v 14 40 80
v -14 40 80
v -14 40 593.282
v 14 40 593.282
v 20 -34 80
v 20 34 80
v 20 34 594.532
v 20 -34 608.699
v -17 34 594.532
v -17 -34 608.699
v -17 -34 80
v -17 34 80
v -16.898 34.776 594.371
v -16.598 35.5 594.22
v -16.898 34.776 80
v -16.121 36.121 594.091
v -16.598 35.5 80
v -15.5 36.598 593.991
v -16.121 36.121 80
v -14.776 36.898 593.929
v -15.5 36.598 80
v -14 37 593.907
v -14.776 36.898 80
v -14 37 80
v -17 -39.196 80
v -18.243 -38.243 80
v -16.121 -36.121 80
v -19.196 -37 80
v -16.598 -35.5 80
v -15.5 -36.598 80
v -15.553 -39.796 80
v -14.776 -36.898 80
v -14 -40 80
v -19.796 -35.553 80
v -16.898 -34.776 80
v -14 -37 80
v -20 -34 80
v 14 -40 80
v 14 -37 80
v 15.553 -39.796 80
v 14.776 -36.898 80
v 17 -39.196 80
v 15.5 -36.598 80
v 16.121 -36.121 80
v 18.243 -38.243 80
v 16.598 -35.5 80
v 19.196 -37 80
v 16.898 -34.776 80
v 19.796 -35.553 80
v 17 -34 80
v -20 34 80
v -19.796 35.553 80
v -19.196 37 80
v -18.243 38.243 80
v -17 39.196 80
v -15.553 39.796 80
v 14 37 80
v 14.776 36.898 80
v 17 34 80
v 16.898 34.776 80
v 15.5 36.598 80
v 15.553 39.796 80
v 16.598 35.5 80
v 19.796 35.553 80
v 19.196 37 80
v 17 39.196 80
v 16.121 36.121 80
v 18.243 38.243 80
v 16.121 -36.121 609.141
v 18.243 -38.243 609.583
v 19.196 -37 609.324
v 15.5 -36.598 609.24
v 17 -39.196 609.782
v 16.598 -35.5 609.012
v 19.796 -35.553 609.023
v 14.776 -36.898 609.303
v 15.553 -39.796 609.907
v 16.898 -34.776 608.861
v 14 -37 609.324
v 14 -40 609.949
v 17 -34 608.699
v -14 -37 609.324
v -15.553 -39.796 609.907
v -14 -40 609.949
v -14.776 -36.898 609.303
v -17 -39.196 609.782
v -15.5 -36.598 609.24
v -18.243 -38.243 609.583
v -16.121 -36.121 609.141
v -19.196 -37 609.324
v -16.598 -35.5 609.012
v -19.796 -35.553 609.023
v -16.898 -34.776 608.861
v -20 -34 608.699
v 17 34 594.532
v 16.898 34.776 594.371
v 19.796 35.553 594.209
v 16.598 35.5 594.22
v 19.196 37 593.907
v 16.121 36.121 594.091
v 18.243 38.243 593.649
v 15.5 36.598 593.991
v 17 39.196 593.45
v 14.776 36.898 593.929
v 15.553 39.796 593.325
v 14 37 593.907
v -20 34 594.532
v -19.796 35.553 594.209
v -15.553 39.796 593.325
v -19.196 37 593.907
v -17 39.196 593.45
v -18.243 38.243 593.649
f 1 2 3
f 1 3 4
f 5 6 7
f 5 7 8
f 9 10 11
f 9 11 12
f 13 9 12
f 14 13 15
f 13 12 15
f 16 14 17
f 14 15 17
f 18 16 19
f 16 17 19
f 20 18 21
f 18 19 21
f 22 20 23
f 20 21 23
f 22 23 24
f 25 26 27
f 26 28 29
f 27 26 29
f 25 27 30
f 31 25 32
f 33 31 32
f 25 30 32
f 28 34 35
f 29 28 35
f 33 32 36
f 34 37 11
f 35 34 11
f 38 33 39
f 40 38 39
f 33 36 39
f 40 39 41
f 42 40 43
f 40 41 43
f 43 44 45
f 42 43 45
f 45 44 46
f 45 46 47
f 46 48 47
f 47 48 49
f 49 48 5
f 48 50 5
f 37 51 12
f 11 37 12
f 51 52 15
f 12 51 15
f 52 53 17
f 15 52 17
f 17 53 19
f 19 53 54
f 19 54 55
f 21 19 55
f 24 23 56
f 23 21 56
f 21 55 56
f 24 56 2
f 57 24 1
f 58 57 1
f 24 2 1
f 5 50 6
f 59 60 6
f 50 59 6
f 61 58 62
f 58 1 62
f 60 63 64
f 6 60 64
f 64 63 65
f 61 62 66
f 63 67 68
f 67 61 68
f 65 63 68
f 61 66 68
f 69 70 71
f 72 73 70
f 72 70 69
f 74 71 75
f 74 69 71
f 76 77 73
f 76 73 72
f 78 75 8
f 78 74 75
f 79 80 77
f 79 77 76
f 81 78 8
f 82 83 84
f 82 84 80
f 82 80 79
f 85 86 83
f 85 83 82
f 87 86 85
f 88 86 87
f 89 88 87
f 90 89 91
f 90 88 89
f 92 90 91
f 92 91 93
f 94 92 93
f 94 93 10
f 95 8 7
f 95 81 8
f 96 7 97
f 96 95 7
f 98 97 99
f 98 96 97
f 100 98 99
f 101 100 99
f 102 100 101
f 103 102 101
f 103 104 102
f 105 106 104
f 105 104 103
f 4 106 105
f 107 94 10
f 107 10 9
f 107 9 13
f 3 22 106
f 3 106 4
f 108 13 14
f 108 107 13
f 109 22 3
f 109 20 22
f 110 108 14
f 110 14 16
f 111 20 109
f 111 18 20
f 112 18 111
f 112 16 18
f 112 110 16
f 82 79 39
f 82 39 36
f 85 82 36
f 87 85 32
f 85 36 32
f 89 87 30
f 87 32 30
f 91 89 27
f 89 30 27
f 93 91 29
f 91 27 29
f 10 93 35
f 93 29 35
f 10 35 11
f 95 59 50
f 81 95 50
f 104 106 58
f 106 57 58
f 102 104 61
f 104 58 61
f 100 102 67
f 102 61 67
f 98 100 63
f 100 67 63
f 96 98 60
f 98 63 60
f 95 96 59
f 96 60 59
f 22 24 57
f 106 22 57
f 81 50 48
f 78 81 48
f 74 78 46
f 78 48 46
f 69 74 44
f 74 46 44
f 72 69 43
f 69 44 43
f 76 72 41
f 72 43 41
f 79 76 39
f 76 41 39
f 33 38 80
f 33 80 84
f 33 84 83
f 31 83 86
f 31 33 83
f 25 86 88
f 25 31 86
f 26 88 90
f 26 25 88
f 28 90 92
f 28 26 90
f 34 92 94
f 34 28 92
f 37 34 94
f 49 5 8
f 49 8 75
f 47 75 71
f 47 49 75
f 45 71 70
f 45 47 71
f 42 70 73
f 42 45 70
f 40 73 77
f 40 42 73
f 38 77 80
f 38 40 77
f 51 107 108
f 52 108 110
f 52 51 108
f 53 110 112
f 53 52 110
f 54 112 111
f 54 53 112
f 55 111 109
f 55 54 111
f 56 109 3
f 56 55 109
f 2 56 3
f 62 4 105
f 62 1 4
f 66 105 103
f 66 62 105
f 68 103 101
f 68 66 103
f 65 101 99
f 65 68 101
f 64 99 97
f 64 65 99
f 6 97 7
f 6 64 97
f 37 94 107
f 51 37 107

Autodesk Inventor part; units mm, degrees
ref_plane "Start Plane" through (0, 0, 80) normal (0, 0, 1) x (1, 0, 0)
ref_plane "End Plane" through (0, 0, 609.949) normal (0, 0, 1) x (1, 0, 0)
sketch "Sketch" plane through (0, 0, 0) normal (0, 0, 1) x (1, 0, 0)
  line L0 (-20, -34) -> (-20, 34)
  line L1 (-14, 40) -> (14, 40)
  line L2 (20, 34) -> (20, -34)
  line L3 (14, -40) -> (-14, -40)
  arc A0 (-20, -34) -> (-14, -40) centre (-14, -34) ccw
  arc A1 (20, 34) -> (14, 40) centre (14, 34) ccw
  arc A2 (-14, 40) -> (-20, 34) centre (-14, 34) ccw
  arc A3 (14, -40) -> (20, -34) centre (14, -34) ccw
  arc A4 (-14, 37) -> (-17, 34) centre (-14, 34) ccw
  line L4 (-14, 37) -> (14, 37)
  arc A5 (17, 34) -> (14, 37) centre (14, 34) ccw
  line L5 (17, 34) -> (17, -34)
  arc A6 (14, -37) -> (17, -34) centre (14, -34) ccw
  line L6 (14, -37) -> (-14, -37)
  arc A7 (-17, -34) -> (-14, -37) centre (-14, -34) ccw
  line L7 (-17, -34) -> (-17, 34)
  line L8 (0, 57.7397) -> (0, -57.7397) construction
  line L9 (-29.7397, 0) -> (29.7397, 0) construction
  dimension "d7" = 6
  dimension "d9" = 40
  dimension "d11" = 80
  dimension "d12" = 3
  dimension "d15" = 20
  dimension "d16" = 40
extrude "Body" add sketch "Sketch" along normal up to surface (529.949 mm away) from surface at 80
sketch "Sketch3" plane through (0, 0, 0) normal (0, 0, 1) x (1, 0, 0)
  line L0 (0, 0) -> (10, 0)
ref_plane "Work Plane3" through (0, 0, 0) normal (0, -1, 0) x (1, 0, 0)
ref_plane "Work Plane4" through (14, 1823.6837, 221.6816) normal (0, 0.2039543, 0.9789804) x (1, 0, 0)
split "Split1" plane through (14, 1823.6837, 221.6816) removes the side toward (0, 0.2039543, 0.9789804)
sketch "Sketch4" plane through (0, 0, 0) normal (0, -1, 0) x (1, 0, 0)
  line L0 (-2, 80) -> (12, 80) projected
  line L1 (-2, 609.949) -> (12, 609.949) projected
  dimension "d18" = 529.949
equation "\"d7\" = G_IR"
equation "\"d9\" = G_W"
equation "\"d11\" = G_H"
equation "\"d12\" = G_T"
equation "\"d15\" = 0.5 * d9"
equation "\"d16\" = 0.5 * d11"
equation "\"d3\" = G_L"
equation "\"G_W\" = 40"
equation "\"G_H\" = 80"
equation "\"G_T\" = 3"
equation "\"G_IR\" = 6"
equation "\"G_L\" = d18"
equation "\"G_OFFSET_END\" = -65.051"
equation "\"d14\" = G_OFFSET_END + B_L"
equation "\"B_L\" = 675"
properties part number "ISO 10799-2 - 80x40x3 - 529.95" material "Steel, Mild"
